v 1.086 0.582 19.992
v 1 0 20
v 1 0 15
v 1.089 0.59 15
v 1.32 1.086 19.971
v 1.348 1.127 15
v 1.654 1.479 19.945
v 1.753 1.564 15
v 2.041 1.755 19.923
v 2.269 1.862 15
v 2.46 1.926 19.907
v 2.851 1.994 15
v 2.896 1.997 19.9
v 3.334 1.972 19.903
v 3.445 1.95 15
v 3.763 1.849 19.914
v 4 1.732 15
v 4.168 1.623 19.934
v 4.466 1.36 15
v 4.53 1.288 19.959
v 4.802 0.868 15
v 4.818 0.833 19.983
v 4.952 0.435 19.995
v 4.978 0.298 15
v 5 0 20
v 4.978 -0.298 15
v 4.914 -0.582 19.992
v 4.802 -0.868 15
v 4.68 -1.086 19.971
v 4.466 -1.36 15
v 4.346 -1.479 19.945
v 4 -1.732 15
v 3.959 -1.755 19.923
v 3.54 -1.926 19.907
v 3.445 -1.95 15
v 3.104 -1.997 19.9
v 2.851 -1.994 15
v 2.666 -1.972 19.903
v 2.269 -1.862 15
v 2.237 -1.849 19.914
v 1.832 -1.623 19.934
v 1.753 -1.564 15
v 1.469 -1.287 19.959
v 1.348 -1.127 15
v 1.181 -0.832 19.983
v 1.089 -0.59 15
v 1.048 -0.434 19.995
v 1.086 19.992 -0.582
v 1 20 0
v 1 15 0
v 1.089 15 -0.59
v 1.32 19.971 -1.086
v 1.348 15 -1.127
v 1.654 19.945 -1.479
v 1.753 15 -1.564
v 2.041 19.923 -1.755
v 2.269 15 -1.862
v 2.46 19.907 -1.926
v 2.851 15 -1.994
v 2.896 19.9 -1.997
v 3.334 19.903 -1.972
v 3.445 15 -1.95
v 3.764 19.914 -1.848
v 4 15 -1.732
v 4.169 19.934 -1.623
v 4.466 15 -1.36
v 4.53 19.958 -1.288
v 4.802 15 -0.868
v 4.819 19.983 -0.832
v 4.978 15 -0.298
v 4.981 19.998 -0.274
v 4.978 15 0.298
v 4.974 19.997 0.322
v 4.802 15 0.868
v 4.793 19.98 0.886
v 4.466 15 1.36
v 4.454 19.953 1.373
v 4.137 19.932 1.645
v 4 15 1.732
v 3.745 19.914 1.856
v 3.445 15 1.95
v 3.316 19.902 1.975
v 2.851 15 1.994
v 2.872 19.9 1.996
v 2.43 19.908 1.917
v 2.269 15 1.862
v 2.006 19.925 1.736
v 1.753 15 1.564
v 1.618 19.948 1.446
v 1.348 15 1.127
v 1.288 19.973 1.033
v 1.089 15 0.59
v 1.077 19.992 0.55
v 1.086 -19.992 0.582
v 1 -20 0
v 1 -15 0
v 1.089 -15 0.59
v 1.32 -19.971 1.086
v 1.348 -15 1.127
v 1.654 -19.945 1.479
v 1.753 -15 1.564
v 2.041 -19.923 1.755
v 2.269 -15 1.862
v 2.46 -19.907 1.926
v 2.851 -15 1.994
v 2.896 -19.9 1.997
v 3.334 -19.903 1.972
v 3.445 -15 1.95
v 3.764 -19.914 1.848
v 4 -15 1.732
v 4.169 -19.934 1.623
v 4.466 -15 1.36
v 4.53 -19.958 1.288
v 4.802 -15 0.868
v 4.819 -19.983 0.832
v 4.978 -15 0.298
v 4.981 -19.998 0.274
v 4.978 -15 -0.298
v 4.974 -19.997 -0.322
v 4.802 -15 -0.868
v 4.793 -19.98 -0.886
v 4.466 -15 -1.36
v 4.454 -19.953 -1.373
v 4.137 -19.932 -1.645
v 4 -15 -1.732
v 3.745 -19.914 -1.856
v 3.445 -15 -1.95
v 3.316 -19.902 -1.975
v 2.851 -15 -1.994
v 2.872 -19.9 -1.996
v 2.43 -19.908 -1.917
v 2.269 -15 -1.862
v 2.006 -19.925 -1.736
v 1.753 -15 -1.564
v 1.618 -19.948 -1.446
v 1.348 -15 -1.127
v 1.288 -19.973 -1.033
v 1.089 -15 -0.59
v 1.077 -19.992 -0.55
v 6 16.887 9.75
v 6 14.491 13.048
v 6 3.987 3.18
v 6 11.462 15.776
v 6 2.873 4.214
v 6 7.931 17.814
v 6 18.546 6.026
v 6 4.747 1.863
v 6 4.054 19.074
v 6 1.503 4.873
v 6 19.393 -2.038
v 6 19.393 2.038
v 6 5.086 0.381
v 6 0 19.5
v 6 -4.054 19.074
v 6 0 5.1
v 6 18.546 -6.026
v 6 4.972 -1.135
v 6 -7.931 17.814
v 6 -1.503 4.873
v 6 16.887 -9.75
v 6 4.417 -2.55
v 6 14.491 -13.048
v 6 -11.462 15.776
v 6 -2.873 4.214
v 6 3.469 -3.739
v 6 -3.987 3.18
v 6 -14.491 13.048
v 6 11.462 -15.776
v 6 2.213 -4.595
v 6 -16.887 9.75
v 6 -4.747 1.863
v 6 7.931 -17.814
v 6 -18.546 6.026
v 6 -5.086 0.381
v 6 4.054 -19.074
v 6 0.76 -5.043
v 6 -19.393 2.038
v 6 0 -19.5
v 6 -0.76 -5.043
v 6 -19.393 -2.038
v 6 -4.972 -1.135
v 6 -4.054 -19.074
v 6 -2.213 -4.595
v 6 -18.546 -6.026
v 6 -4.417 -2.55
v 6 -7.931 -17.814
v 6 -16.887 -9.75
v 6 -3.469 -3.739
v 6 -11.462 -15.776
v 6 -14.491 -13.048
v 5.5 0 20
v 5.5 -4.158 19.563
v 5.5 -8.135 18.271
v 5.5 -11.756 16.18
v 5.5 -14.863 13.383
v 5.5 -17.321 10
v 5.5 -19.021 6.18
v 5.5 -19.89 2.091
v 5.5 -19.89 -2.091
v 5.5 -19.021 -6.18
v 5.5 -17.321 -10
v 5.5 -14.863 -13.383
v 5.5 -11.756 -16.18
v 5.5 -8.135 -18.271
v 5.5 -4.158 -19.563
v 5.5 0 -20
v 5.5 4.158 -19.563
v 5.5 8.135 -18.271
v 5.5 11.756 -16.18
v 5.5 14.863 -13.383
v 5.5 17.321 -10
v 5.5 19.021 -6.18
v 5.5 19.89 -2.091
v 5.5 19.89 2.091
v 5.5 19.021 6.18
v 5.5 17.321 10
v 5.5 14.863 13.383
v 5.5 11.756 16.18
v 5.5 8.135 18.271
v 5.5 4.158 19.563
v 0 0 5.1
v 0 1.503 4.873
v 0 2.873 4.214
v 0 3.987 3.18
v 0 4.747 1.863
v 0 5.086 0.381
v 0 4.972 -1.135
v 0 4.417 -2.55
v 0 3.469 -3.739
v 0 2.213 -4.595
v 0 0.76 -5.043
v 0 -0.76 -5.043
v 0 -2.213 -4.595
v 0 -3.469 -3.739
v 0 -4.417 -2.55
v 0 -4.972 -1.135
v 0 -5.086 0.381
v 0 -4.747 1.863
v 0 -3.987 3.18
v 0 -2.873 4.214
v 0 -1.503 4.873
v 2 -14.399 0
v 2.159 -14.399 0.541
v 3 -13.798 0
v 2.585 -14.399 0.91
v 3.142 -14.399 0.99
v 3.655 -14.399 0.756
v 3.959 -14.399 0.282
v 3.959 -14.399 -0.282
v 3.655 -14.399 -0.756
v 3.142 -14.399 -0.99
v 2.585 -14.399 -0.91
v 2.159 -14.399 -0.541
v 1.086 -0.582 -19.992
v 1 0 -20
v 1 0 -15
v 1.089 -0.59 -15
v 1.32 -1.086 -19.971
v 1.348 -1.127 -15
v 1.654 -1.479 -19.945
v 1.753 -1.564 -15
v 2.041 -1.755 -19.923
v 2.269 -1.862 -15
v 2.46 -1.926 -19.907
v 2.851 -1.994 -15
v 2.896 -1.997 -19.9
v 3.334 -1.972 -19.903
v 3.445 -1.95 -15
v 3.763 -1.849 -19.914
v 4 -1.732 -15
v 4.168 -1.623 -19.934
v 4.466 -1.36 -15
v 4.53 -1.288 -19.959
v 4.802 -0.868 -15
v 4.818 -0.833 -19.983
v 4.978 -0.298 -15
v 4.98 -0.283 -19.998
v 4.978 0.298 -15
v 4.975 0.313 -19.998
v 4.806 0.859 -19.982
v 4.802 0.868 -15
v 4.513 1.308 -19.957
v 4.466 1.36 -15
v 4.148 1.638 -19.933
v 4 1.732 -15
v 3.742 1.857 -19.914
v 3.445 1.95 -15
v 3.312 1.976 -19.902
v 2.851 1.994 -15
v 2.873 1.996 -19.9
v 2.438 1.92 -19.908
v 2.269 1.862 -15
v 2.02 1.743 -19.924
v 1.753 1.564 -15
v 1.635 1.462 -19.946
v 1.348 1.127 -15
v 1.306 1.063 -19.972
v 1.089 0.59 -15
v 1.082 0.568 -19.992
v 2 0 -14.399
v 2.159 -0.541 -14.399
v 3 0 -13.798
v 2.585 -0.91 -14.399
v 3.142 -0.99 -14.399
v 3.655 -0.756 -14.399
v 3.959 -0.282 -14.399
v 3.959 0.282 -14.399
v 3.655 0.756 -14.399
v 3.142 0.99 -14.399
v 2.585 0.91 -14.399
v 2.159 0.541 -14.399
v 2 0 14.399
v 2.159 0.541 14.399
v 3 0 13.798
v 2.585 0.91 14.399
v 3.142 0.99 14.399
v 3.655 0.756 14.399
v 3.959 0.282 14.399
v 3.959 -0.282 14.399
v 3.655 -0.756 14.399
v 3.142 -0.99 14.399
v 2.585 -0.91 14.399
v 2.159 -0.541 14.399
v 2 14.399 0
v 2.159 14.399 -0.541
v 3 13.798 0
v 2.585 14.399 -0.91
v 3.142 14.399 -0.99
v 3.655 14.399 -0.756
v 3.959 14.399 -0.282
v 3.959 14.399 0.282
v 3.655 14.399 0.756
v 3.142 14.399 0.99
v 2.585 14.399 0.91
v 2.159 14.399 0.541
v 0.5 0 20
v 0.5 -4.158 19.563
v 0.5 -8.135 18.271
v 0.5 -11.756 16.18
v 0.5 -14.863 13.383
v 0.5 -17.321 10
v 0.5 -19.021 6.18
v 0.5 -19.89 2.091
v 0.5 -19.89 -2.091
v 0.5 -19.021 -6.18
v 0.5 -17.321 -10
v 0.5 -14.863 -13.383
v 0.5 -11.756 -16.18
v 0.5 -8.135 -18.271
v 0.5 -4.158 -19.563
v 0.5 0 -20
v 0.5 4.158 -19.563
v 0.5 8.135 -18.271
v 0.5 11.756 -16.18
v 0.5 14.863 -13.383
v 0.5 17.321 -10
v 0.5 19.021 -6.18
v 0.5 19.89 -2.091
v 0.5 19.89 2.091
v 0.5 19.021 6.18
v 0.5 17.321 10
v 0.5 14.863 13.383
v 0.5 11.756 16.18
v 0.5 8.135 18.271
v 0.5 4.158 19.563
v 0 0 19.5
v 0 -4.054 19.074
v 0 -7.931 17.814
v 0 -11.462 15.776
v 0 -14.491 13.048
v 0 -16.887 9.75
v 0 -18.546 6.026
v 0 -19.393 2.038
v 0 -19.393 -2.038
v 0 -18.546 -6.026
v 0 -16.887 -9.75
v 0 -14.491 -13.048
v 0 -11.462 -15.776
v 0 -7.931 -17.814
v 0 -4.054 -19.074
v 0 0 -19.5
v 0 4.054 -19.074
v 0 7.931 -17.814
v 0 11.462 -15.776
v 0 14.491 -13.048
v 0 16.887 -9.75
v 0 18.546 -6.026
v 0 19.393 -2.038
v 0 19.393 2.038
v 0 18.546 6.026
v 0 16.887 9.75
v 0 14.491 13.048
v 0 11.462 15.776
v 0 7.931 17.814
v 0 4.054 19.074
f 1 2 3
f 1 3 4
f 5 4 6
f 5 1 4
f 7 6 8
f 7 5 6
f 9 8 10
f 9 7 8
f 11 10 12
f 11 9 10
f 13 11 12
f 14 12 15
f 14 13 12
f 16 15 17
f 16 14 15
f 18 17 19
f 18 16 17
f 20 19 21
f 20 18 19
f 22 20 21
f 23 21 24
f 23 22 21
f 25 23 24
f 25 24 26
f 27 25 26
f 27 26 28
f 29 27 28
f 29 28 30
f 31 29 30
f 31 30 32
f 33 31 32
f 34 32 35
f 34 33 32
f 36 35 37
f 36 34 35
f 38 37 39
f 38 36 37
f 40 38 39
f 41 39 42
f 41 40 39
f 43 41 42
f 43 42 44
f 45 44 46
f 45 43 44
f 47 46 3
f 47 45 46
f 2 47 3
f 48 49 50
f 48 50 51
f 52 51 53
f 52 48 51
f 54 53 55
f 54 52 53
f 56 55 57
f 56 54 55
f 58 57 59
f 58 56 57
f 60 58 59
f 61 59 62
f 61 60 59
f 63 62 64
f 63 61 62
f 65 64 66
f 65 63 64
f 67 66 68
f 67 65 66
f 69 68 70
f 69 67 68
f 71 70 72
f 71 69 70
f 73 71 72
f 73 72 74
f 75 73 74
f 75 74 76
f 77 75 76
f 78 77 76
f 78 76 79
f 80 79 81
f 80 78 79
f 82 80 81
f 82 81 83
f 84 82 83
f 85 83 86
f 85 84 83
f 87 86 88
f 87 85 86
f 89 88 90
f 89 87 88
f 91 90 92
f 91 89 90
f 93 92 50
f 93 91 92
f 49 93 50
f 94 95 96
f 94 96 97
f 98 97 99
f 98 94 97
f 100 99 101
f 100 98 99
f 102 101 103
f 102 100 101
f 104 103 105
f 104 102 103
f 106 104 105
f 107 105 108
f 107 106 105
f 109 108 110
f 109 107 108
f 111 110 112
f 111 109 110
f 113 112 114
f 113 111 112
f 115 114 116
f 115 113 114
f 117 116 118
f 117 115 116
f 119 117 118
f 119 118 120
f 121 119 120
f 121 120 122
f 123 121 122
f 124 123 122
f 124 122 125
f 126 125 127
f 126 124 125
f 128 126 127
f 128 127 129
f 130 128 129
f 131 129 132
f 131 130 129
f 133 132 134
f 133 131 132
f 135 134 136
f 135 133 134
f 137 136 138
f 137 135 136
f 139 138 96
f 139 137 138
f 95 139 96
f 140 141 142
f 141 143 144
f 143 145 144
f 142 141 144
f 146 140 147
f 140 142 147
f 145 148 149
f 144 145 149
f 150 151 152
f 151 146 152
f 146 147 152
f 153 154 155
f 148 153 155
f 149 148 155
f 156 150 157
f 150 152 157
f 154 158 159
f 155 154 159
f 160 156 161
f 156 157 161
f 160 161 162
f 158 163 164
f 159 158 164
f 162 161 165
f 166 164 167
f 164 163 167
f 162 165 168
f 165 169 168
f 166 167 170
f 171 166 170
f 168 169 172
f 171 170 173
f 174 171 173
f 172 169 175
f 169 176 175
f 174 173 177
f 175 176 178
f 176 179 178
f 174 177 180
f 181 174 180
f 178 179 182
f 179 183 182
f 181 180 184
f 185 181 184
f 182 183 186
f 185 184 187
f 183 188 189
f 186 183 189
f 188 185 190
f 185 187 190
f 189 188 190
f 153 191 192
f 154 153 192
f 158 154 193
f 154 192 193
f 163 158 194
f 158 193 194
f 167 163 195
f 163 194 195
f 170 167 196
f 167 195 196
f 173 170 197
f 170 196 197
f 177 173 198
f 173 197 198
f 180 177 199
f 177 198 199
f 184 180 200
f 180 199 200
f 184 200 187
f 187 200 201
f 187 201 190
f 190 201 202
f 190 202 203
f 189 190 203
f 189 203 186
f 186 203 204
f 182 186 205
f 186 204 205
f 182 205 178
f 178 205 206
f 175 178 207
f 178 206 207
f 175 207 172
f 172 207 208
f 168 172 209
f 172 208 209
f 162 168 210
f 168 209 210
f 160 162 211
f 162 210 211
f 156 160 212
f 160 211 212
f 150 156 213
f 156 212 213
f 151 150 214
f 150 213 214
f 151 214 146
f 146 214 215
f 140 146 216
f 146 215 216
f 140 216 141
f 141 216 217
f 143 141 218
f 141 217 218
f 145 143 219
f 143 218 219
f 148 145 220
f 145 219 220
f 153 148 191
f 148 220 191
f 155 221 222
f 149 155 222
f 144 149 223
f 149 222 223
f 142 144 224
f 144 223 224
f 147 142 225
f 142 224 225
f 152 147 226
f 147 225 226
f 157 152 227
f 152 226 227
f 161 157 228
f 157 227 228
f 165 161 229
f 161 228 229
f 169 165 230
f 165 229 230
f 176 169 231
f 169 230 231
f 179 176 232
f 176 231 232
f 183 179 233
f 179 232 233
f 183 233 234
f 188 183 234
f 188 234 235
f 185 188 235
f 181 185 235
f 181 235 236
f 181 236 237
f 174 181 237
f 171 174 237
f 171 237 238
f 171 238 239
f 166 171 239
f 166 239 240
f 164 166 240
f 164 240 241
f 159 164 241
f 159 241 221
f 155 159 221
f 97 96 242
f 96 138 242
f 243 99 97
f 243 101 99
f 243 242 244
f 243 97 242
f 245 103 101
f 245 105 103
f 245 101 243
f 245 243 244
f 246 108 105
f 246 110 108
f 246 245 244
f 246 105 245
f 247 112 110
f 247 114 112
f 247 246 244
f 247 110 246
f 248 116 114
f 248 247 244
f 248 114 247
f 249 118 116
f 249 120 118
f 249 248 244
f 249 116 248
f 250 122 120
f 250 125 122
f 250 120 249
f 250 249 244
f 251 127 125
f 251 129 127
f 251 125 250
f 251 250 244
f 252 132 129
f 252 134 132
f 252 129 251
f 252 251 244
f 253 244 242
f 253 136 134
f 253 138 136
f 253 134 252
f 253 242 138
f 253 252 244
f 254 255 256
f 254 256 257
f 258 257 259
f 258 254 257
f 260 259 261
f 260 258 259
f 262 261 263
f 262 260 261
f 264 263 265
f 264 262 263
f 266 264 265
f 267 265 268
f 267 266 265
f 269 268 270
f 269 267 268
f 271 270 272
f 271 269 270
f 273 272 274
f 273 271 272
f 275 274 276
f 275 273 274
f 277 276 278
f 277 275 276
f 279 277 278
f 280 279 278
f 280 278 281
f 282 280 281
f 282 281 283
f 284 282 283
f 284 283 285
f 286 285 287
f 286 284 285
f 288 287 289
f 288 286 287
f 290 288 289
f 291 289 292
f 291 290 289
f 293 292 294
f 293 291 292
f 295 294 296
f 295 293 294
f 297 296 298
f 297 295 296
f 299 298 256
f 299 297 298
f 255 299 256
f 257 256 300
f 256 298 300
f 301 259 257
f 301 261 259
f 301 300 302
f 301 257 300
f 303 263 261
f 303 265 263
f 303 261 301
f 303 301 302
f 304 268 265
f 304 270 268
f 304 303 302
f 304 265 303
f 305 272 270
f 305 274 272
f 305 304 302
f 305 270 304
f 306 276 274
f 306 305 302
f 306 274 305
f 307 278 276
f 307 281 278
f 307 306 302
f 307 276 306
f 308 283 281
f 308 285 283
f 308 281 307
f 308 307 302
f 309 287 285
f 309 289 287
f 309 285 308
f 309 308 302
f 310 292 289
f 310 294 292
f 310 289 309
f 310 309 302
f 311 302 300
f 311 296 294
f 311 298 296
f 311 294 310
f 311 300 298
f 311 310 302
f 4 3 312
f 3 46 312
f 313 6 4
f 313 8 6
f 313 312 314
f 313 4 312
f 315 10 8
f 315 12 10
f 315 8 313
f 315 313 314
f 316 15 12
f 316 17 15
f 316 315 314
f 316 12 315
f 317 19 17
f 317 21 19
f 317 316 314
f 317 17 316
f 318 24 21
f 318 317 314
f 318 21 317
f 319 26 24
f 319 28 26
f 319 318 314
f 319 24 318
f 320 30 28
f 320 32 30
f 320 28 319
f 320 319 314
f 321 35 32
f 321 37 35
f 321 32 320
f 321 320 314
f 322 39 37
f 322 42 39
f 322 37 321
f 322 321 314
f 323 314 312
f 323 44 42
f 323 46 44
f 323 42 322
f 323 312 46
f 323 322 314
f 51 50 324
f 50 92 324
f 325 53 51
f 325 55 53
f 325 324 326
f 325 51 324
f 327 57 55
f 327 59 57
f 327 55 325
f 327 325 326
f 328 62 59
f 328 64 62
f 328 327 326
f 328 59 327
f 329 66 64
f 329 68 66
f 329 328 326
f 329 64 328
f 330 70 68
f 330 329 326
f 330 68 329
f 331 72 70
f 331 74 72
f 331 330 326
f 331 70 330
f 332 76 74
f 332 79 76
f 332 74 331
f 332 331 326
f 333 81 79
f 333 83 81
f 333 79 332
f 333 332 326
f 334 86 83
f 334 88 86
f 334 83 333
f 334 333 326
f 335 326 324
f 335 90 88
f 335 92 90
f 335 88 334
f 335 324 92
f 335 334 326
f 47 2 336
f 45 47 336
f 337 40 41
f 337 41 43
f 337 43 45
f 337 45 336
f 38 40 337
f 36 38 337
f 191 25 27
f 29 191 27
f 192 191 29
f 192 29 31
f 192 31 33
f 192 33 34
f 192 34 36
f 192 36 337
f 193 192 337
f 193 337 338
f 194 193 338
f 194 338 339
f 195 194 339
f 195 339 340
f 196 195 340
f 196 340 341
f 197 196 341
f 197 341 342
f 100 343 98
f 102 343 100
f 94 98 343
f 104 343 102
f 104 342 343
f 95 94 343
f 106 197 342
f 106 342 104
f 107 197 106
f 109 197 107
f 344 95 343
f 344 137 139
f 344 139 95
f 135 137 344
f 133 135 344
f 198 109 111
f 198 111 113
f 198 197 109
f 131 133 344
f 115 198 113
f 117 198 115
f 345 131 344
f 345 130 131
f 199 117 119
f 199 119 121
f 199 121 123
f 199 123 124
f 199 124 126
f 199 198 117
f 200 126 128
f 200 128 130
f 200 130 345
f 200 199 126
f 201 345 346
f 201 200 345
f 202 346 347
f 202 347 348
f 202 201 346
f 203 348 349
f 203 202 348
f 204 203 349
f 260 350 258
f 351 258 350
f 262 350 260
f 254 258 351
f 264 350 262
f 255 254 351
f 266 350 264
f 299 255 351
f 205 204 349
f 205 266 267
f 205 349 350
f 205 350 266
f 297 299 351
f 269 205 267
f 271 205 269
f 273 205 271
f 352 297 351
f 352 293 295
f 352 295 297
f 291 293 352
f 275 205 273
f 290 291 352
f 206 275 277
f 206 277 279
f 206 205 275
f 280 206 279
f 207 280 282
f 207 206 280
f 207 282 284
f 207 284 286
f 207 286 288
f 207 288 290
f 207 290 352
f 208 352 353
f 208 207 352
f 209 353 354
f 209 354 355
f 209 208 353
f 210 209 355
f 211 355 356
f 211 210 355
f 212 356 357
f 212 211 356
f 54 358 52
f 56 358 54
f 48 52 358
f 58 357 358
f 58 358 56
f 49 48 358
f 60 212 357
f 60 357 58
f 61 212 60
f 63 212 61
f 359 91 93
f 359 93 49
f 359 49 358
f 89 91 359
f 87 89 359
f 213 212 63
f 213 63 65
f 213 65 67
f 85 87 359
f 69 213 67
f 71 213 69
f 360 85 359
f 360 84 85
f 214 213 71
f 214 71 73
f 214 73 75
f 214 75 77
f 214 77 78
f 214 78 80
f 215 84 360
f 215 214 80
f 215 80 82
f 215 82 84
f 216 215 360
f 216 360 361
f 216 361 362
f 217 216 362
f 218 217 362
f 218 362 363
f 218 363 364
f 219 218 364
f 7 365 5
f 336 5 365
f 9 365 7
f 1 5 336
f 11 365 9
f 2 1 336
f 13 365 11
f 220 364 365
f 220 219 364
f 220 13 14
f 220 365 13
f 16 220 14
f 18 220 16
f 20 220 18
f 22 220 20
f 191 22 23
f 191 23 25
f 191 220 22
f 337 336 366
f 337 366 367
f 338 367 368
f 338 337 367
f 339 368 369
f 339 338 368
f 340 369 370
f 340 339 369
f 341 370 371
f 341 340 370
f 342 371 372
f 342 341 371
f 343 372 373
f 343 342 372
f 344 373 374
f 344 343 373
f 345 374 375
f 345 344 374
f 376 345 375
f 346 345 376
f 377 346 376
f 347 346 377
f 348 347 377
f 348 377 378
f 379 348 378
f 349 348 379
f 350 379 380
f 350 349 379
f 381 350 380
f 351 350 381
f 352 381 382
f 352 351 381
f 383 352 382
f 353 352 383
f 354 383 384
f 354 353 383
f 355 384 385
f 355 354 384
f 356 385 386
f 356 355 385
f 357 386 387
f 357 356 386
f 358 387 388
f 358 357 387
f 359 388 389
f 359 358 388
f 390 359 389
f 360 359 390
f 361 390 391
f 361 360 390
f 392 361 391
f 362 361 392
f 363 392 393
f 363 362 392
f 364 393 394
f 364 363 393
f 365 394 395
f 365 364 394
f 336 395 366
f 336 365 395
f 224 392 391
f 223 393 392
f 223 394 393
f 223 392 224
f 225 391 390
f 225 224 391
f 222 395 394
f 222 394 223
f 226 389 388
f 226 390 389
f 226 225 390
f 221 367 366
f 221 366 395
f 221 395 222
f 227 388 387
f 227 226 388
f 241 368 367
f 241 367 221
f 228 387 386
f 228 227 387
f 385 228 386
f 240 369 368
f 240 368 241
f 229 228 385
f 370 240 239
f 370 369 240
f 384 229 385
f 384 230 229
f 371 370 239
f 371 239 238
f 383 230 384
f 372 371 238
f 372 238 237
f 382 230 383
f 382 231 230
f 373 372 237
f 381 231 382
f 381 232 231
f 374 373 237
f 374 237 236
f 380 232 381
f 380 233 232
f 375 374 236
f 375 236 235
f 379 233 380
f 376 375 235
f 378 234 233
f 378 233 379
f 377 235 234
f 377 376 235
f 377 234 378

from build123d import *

# Parameters (mm, degrees)
ESQUISSE1_W                  = 6
ESQUISSE1_H                  = 20
CHANFREIN1_SIZE              = 0.5
R_P_TITION_CIRCULAIRE1_COUNT = 4
TROU_TARAUD_M12X1_752_D      = 10.2


with BuildPart() as part:
    # Esquisse1 → Base-Révolution (revolve)
    with BuildSketch(Plane.XY, mode=Mode.PRIVATE) as base_r_volution_sk:
        with Locations((3, 10)):
            Rectangle(ESQUISSE1_W, ESQUISSE1_H)
    revolve(base_r_volution_sk.sketch.rotate(Axis((-6.22145749, 0, 0), (1, 0, 0)), 90), axis=Axis((-6.22145749, 0, 0), (1, 0, 0)))

    # Chanfrein1
    chanfrein1_edges = [part.edges().sort_by_distance(p)[0] for p in [
        (6, 0, -20),
        (0, 0, -20),
    ]]
    chamfer(chanfrein1_edges, length=CHANFREIN1_SIZE)

    # Esquisse2 → Trou radial (revolve, cut)
    with BuildSketch(Plane.XY, mode=Mode.PRIVATE) as trou_radial_sk:
        Polygon((5, 20), (3, 20), (3, 13.798278762), (5, 15), align=None)
    trou_radial = revolve(trou_radial_sk.sketch.rotate(Axis((3, 20, 0), (0, -1, 0)), 180), axis=Axis((3, 20, 0), (0, -1, 0)), mode=Mode.SUBTRACT)

    # Répétition circulaire1: Trou radial ×4 about axis
    r_p_tition_circulaire1_axis = Axis((43.77854251, 0, 0), (-1, 0, 0))
    for i in range(1, R_P_TITION_CIRCULAIRE1_COUNT):
        add(trou_radial.rotate(r_p_tition_circulaire1_axis, i * 360 / R_P_TITION_CIRCULAIRE1_COUNT), mode=Mode.SUBTRACT)

    # Trou taraudé M12x1.752 (through all)
    with Locations(Plane(origin=(6, 0, 0), x_dir=(0, 0, -1), z_dir=(1, 0, 0))):
        with Locations((0, 0)):
            Hole(TROU_TARAUD_M12X1_752_D / 2)


solid = part.part
